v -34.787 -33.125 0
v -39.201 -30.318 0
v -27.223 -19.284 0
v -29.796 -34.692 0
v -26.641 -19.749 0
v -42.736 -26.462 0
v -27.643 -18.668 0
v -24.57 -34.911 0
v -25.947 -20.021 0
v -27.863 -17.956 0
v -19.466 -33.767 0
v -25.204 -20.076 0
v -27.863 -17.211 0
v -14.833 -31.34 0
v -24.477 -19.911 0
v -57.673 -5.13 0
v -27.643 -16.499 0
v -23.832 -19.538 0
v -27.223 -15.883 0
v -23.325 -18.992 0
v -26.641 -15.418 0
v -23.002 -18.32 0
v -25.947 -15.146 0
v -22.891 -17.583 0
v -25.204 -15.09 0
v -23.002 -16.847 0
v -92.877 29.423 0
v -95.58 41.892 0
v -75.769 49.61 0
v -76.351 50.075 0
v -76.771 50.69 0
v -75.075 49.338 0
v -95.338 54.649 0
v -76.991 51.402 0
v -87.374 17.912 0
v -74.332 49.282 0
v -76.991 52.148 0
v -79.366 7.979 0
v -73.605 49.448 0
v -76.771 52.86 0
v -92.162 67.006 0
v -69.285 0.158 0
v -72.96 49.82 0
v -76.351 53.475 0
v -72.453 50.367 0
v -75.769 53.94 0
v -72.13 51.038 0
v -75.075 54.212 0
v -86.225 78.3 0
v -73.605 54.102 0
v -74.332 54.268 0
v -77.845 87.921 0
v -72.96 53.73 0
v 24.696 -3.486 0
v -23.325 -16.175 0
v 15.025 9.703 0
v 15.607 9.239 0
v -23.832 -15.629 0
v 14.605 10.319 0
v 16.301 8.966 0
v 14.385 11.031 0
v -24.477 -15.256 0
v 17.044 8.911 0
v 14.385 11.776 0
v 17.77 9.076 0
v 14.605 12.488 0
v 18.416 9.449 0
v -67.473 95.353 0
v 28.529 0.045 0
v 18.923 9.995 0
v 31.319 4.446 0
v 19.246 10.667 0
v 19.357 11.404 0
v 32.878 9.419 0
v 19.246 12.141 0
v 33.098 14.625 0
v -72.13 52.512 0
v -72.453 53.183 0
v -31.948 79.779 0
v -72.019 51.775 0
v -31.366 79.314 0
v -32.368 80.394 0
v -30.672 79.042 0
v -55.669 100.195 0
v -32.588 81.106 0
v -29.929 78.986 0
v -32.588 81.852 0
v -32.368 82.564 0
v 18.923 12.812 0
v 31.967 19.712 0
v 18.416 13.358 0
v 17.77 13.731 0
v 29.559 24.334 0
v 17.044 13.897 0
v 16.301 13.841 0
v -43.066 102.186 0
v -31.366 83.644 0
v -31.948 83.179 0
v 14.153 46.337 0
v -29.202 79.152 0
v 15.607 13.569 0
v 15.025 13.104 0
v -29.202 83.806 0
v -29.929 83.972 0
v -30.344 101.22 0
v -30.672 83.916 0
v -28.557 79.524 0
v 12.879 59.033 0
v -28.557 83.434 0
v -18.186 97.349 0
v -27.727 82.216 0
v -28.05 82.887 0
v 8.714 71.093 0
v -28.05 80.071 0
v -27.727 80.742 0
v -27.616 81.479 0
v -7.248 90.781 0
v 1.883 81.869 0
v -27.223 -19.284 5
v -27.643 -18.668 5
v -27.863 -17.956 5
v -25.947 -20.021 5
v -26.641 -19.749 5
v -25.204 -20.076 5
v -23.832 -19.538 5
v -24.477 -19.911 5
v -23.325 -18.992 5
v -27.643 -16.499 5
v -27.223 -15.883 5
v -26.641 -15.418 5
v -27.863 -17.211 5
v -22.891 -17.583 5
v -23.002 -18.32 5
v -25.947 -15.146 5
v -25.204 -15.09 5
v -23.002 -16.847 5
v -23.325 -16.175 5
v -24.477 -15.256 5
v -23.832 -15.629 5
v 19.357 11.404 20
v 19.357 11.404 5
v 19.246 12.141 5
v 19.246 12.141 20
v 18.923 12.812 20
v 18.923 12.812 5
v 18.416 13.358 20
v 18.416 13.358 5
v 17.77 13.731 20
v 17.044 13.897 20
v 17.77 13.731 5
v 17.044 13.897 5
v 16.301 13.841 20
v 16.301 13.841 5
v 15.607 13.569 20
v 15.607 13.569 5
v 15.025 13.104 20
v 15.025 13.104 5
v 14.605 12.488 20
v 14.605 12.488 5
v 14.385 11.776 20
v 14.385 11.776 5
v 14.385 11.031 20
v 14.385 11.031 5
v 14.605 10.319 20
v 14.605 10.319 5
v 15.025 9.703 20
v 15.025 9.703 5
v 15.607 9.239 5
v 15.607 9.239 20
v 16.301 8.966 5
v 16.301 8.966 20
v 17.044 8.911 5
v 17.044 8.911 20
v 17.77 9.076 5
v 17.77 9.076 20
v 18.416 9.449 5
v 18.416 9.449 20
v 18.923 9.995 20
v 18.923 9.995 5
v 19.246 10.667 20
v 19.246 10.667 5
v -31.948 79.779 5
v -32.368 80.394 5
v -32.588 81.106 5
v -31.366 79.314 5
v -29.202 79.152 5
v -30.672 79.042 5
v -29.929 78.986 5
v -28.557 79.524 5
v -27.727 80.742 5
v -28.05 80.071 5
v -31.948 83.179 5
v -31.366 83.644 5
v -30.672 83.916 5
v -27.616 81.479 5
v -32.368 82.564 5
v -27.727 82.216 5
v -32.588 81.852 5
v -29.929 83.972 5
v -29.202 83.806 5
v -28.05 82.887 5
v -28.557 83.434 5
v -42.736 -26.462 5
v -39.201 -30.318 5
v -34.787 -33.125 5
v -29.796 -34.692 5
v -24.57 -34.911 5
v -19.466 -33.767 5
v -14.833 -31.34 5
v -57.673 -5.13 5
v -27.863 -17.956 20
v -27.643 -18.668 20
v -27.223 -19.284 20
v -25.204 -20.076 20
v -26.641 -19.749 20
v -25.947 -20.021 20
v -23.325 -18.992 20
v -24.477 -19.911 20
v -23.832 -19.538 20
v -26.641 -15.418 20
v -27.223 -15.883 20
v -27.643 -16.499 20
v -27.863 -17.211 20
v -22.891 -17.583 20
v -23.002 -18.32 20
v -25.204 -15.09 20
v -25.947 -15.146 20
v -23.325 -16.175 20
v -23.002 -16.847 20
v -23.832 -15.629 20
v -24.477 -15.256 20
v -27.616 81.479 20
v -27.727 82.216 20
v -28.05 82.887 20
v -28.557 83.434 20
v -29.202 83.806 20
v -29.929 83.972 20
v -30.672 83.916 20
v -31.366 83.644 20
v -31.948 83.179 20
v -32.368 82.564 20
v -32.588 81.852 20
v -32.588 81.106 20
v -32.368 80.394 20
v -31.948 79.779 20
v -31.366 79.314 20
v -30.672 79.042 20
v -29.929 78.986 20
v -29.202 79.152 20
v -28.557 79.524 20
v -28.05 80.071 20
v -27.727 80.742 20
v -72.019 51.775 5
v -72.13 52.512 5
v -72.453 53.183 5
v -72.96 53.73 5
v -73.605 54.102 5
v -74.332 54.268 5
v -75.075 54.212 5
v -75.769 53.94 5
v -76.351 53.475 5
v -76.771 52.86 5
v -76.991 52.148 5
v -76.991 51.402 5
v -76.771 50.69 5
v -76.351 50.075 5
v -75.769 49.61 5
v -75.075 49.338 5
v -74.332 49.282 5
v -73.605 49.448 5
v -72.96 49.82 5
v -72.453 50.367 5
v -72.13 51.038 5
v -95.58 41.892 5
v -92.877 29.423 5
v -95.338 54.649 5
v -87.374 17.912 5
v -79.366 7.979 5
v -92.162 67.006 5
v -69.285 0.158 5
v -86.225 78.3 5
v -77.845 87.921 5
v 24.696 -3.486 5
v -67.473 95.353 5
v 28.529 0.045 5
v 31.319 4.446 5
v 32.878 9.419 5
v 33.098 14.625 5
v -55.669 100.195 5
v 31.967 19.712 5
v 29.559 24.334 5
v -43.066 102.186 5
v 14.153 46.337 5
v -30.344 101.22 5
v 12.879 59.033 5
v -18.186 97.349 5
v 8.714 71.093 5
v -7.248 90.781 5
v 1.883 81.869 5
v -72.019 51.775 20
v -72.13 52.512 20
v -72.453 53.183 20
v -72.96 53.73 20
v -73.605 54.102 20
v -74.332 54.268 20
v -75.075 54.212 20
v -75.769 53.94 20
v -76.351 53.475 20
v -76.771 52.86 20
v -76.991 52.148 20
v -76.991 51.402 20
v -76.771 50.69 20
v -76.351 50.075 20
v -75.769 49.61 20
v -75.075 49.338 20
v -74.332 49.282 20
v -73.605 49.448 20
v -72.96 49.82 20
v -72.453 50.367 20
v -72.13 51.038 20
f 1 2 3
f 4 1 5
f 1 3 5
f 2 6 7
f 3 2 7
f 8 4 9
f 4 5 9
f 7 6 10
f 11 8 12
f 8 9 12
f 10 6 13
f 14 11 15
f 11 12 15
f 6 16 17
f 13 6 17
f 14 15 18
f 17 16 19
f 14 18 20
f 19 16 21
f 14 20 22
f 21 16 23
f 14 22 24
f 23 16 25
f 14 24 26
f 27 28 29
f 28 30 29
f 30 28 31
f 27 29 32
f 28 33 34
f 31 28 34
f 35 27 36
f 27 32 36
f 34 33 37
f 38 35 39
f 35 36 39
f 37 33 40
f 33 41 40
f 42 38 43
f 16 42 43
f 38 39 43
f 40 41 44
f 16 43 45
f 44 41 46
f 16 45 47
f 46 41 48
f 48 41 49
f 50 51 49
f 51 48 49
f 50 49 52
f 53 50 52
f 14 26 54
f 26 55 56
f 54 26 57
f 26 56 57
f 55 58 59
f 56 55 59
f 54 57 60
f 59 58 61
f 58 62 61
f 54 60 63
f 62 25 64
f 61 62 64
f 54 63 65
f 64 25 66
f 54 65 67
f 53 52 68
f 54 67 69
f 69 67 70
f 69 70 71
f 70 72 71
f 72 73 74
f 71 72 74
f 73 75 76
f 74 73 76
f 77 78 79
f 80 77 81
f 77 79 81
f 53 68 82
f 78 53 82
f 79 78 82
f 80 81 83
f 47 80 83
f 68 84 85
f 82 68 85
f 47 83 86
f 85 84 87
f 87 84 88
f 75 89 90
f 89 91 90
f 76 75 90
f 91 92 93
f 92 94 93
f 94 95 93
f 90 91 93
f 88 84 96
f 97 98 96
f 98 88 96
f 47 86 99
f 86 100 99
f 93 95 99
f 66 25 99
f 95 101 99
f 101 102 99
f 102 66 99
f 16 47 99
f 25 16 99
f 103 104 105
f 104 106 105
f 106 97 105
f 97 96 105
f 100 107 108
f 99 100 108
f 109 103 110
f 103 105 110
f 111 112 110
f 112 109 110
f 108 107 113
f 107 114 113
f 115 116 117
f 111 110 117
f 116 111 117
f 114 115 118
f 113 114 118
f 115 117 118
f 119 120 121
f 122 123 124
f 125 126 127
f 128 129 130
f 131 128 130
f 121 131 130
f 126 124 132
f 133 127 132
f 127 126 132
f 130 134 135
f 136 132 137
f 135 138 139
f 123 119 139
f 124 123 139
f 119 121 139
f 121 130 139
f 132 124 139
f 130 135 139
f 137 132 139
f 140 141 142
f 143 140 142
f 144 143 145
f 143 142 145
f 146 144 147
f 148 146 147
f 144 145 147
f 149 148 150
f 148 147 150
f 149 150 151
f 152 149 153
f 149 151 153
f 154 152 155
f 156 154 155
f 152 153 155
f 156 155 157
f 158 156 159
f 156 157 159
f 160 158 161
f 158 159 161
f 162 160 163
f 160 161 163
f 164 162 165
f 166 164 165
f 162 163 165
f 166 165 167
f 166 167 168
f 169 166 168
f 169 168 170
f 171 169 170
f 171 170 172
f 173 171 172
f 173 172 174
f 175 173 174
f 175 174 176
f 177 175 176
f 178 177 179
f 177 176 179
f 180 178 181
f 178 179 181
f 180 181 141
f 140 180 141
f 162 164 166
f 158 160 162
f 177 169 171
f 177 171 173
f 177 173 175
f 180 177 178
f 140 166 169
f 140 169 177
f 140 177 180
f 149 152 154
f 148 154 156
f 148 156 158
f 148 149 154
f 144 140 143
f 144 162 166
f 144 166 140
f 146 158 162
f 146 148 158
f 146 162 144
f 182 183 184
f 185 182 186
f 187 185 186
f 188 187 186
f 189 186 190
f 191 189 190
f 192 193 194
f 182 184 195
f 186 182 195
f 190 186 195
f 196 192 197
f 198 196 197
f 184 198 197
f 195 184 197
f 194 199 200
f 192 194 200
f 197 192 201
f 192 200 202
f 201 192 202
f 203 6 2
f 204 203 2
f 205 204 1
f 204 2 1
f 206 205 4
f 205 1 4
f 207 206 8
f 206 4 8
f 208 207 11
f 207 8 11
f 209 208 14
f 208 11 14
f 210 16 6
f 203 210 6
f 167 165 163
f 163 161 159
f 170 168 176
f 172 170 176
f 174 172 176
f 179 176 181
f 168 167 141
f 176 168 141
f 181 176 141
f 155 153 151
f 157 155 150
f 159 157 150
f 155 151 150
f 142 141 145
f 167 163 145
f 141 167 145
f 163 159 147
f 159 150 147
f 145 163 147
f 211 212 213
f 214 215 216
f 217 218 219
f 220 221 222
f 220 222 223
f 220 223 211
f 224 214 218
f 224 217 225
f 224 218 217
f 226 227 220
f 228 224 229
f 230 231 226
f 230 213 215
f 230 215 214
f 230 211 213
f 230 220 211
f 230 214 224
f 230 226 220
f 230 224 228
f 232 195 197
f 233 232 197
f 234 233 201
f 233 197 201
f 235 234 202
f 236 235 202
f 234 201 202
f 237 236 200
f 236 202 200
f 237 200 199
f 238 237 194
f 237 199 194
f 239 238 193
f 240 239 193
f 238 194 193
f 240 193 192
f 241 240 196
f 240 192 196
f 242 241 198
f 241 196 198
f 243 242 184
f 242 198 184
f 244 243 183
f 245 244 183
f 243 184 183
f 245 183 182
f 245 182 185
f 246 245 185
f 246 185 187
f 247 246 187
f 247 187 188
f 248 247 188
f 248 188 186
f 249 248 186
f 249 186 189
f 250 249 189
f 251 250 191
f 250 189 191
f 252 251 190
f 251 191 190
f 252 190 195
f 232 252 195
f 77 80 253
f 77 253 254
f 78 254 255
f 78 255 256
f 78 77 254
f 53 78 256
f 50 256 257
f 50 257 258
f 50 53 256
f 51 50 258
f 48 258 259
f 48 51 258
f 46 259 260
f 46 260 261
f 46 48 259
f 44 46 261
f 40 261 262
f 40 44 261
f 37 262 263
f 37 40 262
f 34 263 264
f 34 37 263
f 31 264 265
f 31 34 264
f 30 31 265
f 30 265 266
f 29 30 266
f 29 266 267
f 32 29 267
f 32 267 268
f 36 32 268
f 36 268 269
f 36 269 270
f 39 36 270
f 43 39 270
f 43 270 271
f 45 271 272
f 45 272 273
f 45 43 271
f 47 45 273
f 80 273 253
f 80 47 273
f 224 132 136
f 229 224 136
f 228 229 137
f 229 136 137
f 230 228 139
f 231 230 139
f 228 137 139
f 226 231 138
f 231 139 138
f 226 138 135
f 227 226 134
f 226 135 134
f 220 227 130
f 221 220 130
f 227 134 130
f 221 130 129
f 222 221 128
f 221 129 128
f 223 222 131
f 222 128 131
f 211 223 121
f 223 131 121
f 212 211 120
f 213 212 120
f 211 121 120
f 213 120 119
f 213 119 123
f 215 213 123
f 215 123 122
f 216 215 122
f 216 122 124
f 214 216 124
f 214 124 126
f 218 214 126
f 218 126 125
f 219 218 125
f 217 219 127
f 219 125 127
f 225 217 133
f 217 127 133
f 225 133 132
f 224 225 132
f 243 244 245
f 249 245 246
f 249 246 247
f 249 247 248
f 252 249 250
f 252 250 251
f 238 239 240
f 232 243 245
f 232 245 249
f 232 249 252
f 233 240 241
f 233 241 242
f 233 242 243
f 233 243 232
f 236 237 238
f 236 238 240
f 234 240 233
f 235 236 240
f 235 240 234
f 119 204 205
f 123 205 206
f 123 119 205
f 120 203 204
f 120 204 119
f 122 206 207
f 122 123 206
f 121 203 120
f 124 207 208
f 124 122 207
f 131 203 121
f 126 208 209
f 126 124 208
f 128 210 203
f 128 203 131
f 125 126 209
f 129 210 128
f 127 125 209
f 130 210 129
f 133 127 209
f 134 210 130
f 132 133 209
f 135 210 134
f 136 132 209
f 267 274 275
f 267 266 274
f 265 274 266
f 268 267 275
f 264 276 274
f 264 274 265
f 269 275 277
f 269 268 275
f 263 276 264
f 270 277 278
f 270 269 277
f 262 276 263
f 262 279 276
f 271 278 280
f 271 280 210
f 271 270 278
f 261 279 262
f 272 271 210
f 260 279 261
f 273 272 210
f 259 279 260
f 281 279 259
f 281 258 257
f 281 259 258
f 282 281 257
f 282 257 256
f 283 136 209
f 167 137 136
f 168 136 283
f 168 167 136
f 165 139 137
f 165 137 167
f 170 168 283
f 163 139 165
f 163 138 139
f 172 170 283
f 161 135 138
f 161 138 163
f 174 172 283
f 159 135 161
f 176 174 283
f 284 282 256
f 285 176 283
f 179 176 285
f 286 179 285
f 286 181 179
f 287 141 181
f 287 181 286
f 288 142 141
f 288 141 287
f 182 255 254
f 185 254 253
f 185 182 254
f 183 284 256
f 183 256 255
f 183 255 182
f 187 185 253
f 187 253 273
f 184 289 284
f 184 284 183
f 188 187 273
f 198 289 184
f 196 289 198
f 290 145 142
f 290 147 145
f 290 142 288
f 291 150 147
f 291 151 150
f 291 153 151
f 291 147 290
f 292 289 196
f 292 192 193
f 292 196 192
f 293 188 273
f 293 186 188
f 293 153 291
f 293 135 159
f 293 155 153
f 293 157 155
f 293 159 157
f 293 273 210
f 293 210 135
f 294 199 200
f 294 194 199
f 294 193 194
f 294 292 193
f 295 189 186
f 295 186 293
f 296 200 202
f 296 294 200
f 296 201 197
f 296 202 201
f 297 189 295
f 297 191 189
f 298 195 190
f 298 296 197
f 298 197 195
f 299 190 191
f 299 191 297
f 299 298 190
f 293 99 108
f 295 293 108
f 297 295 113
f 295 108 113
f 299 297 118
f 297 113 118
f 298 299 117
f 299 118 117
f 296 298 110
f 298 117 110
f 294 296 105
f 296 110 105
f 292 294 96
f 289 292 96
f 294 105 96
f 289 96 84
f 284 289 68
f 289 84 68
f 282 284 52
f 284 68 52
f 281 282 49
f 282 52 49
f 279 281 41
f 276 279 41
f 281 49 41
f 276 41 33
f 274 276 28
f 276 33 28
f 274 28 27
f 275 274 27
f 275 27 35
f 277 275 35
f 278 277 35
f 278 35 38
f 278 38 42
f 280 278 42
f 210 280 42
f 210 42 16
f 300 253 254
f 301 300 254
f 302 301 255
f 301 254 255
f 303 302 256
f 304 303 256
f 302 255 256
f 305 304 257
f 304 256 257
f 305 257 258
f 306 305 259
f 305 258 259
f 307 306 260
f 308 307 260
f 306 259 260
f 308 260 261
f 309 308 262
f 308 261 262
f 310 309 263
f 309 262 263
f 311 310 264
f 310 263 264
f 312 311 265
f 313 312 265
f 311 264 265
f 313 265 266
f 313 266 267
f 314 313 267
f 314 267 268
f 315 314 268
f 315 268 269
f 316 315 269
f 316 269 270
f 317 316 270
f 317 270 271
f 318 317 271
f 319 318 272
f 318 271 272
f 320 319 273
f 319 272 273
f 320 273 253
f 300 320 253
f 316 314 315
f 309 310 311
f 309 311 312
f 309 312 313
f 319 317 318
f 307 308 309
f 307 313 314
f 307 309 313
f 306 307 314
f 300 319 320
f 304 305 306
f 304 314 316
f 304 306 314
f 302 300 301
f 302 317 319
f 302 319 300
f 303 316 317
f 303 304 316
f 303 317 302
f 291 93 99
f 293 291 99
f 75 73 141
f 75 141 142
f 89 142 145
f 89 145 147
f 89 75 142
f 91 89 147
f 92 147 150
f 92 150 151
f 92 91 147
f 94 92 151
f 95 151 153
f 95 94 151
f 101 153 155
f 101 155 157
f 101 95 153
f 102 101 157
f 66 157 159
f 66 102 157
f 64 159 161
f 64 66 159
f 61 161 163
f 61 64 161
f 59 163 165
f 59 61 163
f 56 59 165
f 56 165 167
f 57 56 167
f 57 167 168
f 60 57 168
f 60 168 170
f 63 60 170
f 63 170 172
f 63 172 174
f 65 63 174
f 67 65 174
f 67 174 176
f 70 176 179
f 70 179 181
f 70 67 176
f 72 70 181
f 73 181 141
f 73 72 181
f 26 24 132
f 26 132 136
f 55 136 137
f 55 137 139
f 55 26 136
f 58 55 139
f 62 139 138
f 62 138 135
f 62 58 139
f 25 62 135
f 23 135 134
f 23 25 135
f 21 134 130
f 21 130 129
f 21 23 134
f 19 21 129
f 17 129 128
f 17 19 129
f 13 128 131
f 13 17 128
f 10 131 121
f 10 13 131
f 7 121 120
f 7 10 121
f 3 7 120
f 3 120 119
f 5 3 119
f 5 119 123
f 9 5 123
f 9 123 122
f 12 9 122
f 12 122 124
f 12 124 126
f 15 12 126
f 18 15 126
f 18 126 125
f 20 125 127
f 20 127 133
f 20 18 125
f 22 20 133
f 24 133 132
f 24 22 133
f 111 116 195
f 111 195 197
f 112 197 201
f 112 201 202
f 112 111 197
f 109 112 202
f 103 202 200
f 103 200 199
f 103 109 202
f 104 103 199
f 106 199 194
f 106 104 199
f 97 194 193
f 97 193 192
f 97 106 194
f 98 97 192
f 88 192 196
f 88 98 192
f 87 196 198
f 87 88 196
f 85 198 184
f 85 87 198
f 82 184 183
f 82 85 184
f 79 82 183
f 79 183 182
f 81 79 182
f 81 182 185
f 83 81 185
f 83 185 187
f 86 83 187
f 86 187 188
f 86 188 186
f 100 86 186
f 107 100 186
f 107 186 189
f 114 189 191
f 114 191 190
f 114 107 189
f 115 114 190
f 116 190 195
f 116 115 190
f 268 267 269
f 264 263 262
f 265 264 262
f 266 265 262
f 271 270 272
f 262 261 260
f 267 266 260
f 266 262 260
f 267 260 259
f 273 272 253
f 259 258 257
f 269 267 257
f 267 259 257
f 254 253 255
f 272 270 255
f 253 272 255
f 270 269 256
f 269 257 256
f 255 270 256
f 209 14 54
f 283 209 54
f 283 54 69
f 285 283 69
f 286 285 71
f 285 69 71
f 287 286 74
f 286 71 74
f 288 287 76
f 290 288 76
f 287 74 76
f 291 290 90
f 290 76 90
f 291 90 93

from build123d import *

# Parameters (mm, degrees)
SKETCH1_R             = 2.5
BOSS_EXTRUDE1_DEPTH   = 5
SKETCH3_R             = 2.5
BOSS_EXTRUDE2_DEPTH   = 15
BOSS_EXTRUDE2_2_DEPTH = 15
BOSS_EXTRUDE2_3_DEPTH = 15
BOSS_EXTRUDE2_4_DEPTH = 15


with BuildPart() as part:
    # Sketch1 → Boss-Extrude1 (new body)
    with BuildSketch(Plane.XY):
        with BuildLine():
            Line((-57.672811588, -5.12960821), (-42.735681757, -26.462040404))
            ThreePointArc((-42.735681757, -26.462040404), (-29.796444215, -34.691786217), (-14.832658533, -31.339517974))
            Line((-14.832658533, -31.339517974), (24.696261992, -3.486298151))
            ThreePointArc((24.696261992, -3.486298151), (32.877554195, 9.418904803), (29.55932054, 24.334236874))
            Line((29.55932054, 24.334236874), (14.152654619, 46.337236099))
            ThreePointArc((14.152654619, 46.337236099), (-72.875300714, 91.93856773), (-57.672811588, -5.12960821))
        make_face()
        with Locations((16.857134213, 11.403652355)):
            Circle(SKETCH1_R, mode=Mode.SUBTRACT)
        with Locations((-25.390539185, -17.583455648)):
            Circle(SKETCH1_R, mode=Mode.SUBTRACT)
        with Locations((-74.51852092, 51.77499716)):
            Circle(SKETCH1_R, mode=Mode.SUBTRACT)
        with Locations((-30.115539643, 81.478943582)):
            Circle(SKETCH1_R, mode=Mode.SUBTRACT)
    extrude(amount=BOSS_EXTRUDE1_DEPTH)


with BuildPart() as body_2:
    # Sketch3 → Boss-Extrude2 (new body)
    with BuildSketch(Plane.XY.offset(5)):
        with Locations((16.857134213, 11.403652355)):
            Circle(SKETCH3_R)
    extrude(amount=BOSS_EXTRUDE2_DEPTH)


with BuildPart() as body_3:
    # Sketch3 → Boss-Extrude2 2 (new body)
    with BuildSketch(Plane.XY.offset(5)):
        with Locations((-25.390539185, -17.583455648)):
            Circle(SKETCH3_R)
    extrude(amount=BOSS_EXTRUDE2_2_DEPTH)


with BuildPart() as body_4:
    # Sketch3 → Boss-Extrude2 3 (new body)
    with BuildSketch(Plane.XY.offset(5)):
        with Locations((-30.115539643, 81.478943582)):
            Circle(SKETCH3_R)
    extrude(amount=BOSS_EXTRUDE2_3_DEPTH)


with BuildPart() as body_5:
    # Sketch3 → Boss-Extrude2 4 (new body)
    with BuildSketch(Plane.XY.offset(5)):
        with Locations((-74.51852092, 51.77499716)):
            Circle(SKETCH3_R)
    extrude(amount=BOSS_EXTRUDE2_4_DEPTH)


solid = Compound([part.part, body_2.part, body_3.part, body_4.part, body_5.part])
